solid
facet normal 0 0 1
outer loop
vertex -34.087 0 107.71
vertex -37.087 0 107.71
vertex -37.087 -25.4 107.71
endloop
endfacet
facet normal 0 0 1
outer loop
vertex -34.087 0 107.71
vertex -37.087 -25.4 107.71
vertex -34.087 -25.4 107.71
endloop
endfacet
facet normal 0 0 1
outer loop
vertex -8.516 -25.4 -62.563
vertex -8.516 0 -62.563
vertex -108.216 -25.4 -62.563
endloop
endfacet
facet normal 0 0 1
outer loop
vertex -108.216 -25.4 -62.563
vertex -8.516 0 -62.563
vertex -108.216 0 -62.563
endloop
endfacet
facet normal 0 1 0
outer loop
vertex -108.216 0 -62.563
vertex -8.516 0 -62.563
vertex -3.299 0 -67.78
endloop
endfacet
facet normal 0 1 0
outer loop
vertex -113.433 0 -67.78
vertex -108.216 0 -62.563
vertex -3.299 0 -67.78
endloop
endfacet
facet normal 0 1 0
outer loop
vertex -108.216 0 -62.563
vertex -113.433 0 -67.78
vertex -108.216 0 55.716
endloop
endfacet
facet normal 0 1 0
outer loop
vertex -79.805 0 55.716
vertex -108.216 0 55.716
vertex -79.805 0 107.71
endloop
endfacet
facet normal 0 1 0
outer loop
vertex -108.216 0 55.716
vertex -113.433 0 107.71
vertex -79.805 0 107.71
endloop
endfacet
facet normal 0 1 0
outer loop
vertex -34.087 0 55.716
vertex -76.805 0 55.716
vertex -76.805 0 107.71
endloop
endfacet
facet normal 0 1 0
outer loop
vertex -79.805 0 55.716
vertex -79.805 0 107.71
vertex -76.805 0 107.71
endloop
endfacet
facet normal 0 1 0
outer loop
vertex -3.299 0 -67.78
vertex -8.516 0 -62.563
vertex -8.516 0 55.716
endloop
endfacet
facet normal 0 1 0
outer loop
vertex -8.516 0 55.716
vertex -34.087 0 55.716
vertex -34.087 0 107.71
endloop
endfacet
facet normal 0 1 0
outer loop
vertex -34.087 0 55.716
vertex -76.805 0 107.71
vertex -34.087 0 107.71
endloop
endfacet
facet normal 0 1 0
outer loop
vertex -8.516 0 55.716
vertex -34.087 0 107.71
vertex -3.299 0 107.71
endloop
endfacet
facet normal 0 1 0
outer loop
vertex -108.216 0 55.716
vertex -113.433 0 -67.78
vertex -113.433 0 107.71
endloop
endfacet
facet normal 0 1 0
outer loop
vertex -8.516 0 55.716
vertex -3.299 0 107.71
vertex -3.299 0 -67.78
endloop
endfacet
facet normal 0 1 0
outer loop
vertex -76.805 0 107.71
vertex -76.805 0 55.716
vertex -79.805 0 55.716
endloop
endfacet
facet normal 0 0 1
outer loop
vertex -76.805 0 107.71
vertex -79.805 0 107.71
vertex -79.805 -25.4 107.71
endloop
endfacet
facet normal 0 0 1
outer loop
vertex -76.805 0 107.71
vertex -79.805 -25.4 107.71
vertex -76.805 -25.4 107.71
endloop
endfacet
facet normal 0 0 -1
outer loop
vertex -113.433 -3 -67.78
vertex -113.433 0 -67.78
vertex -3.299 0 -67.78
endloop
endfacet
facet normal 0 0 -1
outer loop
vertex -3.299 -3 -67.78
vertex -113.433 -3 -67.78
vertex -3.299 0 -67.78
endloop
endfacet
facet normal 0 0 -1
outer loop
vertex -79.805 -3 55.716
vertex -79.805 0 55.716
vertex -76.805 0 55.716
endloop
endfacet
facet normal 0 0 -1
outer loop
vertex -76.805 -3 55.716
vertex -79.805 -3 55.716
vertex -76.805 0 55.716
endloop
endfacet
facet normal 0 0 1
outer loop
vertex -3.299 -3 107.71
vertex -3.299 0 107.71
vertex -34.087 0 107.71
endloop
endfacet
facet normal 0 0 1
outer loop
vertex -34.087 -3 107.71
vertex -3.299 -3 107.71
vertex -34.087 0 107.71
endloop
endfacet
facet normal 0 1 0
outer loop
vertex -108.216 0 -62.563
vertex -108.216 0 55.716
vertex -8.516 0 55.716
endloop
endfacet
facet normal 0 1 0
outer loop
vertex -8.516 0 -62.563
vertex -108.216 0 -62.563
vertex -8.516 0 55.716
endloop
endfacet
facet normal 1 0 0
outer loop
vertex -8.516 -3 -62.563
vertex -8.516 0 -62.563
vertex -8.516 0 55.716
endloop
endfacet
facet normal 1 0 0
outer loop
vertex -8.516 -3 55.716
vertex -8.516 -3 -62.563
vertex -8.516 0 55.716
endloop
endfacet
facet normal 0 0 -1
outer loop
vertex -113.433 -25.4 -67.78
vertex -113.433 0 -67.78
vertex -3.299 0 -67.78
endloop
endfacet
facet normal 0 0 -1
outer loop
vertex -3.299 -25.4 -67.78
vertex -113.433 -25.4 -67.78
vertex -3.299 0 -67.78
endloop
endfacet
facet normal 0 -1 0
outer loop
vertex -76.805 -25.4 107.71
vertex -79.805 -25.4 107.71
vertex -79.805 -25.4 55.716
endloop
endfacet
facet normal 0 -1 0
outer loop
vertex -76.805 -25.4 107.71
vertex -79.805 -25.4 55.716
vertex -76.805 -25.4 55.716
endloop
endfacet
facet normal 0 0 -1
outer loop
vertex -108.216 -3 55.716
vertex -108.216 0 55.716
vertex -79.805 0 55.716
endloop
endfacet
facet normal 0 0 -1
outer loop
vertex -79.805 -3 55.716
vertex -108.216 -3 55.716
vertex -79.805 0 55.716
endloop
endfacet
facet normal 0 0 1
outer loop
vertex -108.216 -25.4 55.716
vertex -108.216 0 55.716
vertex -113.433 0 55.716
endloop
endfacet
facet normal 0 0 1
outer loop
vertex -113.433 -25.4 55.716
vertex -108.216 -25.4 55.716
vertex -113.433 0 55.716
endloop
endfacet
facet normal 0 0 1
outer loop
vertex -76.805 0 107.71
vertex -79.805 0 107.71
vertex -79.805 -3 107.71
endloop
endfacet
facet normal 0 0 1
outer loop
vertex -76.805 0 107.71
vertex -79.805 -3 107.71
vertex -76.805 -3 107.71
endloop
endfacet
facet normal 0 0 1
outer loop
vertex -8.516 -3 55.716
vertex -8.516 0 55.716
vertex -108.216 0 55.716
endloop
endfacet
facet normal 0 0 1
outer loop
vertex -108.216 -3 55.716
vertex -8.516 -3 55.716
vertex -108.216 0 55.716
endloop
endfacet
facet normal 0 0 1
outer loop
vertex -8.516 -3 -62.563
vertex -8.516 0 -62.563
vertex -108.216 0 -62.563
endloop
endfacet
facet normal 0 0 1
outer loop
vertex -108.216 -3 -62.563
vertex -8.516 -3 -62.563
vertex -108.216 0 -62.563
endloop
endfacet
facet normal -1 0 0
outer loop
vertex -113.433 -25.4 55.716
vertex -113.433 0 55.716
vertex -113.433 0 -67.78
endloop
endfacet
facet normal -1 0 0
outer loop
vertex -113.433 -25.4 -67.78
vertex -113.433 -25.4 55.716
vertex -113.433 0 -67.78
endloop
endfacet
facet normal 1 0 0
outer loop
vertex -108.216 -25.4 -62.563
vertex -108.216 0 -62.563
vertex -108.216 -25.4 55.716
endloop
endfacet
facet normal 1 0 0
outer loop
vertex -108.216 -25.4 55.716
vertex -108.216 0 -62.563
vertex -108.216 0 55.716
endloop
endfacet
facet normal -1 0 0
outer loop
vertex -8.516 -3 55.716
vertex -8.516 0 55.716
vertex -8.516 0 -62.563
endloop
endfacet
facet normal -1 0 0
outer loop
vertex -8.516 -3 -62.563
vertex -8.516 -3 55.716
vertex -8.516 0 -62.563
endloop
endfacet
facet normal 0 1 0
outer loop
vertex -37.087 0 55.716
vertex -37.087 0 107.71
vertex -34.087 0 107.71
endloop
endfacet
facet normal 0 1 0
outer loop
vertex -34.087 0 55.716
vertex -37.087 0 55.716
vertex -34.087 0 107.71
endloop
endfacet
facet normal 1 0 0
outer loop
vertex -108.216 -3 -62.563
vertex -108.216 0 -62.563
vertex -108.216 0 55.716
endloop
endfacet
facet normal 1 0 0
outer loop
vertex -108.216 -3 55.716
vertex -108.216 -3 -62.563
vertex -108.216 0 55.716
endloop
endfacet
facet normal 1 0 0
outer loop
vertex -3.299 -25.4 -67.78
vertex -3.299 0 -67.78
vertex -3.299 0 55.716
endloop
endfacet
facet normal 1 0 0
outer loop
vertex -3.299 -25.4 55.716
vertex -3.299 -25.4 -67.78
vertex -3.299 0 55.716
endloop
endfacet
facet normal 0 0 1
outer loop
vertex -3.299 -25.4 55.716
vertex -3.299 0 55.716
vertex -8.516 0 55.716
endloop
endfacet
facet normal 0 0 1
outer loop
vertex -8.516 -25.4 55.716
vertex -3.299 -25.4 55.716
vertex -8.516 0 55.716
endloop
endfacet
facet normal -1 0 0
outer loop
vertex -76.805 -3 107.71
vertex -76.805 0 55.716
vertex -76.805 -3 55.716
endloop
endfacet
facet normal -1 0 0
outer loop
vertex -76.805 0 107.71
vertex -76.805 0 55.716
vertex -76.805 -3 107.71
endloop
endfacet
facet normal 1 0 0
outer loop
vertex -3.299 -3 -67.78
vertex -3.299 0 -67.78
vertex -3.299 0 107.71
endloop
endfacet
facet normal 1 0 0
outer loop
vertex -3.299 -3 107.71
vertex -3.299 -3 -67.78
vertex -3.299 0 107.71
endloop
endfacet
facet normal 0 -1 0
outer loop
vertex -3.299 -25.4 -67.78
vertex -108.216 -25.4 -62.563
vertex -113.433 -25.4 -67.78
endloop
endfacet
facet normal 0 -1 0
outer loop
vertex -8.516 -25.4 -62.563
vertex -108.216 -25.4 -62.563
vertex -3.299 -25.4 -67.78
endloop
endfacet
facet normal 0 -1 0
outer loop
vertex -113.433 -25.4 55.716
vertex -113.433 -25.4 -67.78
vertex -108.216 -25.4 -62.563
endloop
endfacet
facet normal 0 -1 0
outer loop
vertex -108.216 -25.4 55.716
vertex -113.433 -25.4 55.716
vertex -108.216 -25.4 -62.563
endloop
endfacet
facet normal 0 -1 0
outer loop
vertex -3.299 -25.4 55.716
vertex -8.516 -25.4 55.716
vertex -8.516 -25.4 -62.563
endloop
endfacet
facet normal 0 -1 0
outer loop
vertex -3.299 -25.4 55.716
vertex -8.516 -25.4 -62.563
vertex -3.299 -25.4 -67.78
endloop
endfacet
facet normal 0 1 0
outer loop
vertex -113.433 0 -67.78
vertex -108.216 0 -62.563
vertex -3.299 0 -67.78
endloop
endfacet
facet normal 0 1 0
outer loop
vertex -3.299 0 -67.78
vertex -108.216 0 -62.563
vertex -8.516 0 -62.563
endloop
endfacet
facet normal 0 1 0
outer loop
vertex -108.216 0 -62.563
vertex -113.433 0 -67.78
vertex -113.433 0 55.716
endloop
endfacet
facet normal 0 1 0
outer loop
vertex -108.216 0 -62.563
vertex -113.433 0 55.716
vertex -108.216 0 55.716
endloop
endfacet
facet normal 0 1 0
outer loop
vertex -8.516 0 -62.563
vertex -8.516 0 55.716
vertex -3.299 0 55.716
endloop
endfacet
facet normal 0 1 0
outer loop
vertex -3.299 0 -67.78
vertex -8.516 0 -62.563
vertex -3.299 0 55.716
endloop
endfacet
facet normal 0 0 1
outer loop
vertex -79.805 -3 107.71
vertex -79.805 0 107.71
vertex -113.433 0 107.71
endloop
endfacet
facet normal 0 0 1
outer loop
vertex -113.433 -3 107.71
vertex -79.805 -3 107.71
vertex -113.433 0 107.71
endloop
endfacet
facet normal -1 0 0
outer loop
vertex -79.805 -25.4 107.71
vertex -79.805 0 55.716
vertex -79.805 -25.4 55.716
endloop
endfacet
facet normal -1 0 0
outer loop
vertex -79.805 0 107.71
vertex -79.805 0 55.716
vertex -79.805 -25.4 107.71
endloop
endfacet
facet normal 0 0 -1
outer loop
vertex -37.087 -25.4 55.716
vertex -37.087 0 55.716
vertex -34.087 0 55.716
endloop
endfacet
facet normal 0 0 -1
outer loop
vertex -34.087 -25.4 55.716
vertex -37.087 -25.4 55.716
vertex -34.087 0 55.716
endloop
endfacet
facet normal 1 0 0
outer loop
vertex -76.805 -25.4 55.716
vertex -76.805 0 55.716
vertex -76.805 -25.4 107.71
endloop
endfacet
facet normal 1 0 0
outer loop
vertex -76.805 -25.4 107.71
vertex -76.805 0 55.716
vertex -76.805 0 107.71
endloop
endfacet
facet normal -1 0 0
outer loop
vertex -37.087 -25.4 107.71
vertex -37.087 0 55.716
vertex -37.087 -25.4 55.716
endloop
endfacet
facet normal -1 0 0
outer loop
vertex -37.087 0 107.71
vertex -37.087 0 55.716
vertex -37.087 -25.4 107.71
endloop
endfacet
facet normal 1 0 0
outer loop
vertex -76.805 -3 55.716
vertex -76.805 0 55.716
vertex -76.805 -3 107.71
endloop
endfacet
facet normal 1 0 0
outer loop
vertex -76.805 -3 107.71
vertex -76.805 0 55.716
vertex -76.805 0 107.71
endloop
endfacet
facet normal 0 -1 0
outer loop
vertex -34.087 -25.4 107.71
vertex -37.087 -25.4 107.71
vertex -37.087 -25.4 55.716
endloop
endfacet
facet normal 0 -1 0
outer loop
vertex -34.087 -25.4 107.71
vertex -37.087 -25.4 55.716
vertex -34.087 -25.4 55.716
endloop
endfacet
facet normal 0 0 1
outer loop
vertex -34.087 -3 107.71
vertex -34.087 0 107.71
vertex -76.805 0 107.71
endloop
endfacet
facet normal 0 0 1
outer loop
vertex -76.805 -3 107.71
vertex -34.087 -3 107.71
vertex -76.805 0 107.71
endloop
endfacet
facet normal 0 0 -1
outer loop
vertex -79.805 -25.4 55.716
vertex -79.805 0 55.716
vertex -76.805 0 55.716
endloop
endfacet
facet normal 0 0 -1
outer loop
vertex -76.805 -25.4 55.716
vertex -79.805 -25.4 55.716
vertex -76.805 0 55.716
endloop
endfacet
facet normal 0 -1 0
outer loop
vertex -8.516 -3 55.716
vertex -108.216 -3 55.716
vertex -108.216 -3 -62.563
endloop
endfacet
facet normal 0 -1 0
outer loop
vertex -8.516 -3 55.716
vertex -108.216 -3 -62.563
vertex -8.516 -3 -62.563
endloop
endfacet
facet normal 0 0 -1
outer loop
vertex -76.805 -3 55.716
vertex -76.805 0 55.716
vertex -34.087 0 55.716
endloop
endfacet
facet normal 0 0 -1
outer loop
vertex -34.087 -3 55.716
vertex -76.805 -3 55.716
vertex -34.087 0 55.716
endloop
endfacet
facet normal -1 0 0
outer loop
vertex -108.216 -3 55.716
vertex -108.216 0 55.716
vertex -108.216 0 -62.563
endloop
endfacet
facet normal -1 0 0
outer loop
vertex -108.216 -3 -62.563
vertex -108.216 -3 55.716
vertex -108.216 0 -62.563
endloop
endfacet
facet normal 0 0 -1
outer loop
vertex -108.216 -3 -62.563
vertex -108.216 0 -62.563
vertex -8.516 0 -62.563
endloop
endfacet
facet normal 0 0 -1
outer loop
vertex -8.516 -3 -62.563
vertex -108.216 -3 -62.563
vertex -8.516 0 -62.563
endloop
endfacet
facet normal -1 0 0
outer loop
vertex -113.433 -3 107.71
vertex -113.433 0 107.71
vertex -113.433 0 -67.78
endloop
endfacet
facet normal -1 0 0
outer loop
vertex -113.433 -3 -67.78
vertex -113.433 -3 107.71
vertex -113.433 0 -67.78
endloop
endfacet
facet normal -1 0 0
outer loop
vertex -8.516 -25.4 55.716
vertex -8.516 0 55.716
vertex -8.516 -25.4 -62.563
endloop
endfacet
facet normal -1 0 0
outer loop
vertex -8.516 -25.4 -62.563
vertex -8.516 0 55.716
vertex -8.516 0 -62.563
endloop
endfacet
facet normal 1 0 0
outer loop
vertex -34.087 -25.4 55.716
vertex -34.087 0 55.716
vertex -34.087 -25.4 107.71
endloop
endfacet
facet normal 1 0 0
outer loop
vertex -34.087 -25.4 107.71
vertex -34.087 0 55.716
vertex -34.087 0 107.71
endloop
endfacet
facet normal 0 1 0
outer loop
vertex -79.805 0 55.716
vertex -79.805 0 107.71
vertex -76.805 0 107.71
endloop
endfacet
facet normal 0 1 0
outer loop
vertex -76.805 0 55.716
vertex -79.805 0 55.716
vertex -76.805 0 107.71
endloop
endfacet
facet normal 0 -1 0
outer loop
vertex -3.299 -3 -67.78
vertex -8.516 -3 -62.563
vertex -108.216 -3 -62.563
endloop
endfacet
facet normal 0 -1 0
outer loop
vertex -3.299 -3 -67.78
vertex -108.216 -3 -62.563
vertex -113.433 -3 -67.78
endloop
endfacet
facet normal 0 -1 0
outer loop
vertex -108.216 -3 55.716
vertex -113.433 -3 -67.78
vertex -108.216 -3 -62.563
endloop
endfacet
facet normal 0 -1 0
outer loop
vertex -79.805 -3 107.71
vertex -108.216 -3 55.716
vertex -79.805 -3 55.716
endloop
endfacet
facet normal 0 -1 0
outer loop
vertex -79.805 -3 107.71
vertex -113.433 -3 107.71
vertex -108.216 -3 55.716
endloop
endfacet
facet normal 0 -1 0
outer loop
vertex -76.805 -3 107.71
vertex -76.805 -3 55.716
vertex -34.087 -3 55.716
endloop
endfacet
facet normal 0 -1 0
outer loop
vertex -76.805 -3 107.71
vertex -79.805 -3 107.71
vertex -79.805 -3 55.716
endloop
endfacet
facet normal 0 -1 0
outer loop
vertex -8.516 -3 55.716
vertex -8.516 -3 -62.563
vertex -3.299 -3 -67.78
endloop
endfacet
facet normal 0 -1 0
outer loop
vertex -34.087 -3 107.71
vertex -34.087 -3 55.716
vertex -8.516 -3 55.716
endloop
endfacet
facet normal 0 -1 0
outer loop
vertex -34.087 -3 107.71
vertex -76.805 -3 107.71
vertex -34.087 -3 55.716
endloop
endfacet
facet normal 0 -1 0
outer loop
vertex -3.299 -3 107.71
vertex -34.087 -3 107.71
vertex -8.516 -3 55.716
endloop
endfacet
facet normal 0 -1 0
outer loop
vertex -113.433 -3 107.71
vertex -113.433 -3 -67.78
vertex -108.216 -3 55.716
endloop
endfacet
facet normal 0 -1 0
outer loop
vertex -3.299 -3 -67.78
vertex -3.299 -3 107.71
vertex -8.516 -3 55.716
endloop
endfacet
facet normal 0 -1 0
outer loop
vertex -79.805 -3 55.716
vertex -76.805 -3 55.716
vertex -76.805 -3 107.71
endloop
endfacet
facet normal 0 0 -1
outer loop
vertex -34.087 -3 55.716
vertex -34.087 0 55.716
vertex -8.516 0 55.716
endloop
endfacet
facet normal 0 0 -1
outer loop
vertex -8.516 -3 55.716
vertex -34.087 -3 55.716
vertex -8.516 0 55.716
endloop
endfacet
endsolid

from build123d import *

# Parameters (mm, degrees)
F0_W     = 3
F0_H     = 51.993689
F1_DEPTH = 25.4
F0_W_2   = 39.718309
F2_DEPTH = 3
F3_DEPTH = 3


with BuildPart() as f1:
    # F0 (on Front) → F1 (new body)
    with BuildSketch(Plane.XZ):
        with Locations((-78.305232, 81.712723)):
            Rectangle(F0_W, F0_H)
        with Locations((-35.586923, 81.712723)):
            Rectangle(F0_W, F0_H)
        Polygon((-108.21604, 55.715879), (-113.432544, 55.715879), (-113.432544, -67.779744), (-3.298998, -67.779744), (-3.298998, 55.715879), (-8.515501, 55.715879), (-8.515501, -62.563241), (-108.21604, -62.563241), align=None)
    extrude(amount=F1_DEPTH)


with BuildPart() as f2:
    # F0 (on Front) → F2 (new body)
    with BuildSketch(Plane.XZ):
        Polygon((-79.805232, 107.709568), (-113.432544, 107.709568), (-113.432544, 55.715879), (-108.21604, 55.715879), (-79.805232, 55.715879), align=None)
        with Locations((-78.305232, 81.712723)):
            Rectangle(F0_W, F0_H)
        Polygon((-108.21604, 55.715879), (-113.432544, 55.715879), (-113.432544, -67.779744), (-3.298998, -67.779744), (-3.298998, 55.715879), (-8.515501, 55.715879), (-8.515501, -62.563241), (-108.21604, -62.563241), align=None)
        with Locations((-56.946077, 81.712723)):
            Rectangle(F0_W_2, F0_H)
        with Locations((-35.586923, 81.712723)):
            Rectangle(F0_W, F0_H)
        Polygon((-3.298998, 107.709568), (-34.086923, 107.709568), (-34.086923, 55.715879), (-8.515501, 55.715879), (-3.298998, 55.715879), align=None)
    extrude(amount=F2_DEPTH)


with BuildPart() as f3:
    # F0 (on Front) → F3 (new body)
    with BuildSketch(Plane.XZ):
        Polygon((-76.805232, 55.715879), (-79.805232, 55.715879), (-108.21604, 55.715879), (-108.21604, -62.563241), (-8.515501, -62.563241), (-8.515501, 55.715879), (-34.086923, 55.715879), (-37.086923, 55.715879), align=None)
    extrude(amount=F3_DEPTH)


solid = Compound([f1.part, f2.part, f3.part])
